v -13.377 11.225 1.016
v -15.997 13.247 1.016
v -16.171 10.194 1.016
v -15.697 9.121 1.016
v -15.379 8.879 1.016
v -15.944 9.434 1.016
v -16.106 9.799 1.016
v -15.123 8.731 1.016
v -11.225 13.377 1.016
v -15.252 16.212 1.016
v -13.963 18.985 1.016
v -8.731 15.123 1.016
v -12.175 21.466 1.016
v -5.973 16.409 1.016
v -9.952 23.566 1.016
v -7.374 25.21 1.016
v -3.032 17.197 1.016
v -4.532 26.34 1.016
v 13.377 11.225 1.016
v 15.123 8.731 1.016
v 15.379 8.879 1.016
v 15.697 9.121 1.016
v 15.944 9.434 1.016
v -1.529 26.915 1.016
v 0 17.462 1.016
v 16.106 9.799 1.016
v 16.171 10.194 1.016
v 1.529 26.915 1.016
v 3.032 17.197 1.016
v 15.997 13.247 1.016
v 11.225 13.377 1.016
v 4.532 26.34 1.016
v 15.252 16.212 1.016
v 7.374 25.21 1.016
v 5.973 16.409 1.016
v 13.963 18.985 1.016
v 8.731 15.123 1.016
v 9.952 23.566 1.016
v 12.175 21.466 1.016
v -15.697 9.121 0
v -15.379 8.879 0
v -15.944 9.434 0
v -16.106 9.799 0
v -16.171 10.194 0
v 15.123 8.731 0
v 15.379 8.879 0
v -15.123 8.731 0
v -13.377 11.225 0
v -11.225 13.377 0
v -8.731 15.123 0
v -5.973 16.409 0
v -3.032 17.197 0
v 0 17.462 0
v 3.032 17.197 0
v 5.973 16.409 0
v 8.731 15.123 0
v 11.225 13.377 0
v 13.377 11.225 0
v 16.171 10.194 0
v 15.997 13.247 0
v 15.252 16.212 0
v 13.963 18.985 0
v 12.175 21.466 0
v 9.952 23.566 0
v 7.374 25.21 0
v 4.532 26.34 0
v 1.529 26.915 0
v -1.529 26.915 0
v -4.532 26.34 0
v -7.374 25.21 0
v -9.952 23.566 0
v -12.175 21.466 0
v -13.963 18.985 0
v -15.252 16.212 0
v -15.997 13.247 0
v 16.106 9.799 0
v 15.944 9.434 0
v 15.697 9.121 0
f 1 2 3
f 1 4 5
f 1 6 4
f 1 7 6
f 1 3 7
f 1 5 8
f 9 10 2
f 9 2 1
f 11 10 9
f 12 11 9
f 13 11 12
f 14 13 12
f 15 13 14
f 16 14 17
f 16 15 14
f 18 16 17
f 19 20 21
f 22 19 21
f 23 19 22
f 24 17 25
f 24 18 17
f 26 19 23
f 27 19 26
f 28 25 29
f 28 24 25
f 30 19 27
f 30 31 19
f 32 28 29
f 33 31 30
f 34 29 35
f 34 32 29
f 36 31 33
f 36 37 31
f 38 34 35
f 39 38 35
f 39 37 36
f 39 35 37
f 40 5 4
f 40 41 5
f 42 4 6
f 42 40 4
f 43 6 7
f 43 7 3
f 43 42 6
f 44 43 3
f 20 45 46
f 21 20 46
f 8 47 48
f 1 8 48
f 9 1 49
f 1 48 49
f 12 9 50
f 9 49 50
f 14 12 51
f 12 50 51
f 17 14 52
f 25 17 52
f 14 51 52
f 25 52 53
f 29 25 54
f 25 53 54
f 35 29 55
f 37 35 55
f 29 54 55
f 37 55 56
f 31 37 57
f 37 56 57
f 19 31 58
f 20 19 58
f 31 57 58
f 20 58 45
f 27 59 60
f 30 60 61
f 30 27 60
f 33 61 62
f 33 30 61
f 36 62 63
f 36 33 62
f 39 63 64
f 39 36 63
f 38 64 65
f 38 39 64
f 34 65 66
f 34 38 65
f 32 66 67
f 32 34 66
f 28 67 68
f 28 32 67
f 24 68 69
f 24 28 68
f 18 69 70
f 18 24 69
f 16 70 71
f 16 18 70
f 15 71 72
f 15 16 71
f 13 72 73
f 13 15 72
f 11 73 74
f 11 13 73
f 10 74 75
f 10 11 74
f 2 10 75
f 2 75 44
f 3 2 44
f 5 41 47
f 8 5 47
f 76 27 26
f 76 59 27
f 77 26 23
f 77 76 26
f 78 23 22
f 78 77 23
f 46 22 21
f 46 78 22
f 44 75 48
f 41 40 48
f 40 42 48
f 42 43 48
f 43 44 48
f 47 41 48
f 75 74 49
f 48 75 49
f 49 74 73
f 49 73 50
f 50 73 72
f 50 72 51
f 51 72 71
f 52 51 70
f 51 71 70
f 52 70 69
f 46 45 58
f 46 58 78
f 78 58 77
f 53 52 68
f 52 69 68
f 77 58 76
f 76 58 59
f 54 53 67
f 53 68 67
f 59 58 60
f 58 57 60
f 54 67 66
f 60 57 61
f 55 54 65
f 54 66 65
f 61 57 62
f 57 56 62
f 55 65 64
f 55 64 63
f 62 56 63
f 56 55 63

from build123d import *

# Parameters (mm, degrees)
BOSS_EXTRUDE1_DEPTH = 1.016
SKETCH2_OUTSIDE_W   = 58.782
SKETCH2_OUTSIDE_H   = 30.295
CUT_EXTRUDE1_DEPTH  = 36.715560747
FILLET1_R           = 1.5875


with BuildPart() as part:
    # Sketch1 → Boss-Extrude1 (new body)
    with BuildSketch(Plane.XY):
        with BuildLine():
            Line((-23.371860585, 13.49375), (-15.122968614, 8.73125))
            ThreePointArc((-15.122968614, 8.73125), (0, 17.4625), (15.122968614, 8.73125))
            Line((15.122968614, 8.73125), (23.371860585, 13.49375))
            ThreePointArc((23.371860585, 13.49375), (0, 26.9875), (-23.371860585, 13.49375))
        make_face()
    extrude(amount=BOSS_EXTRUDE1_DEPTH)

    # Sketch2 outside → Cut-Extrude1 (cut, through all)
    with BuildSketch(Plane.XY.offset(1.016)):
        with Locations((0, 17.8595)):
            Rectangle(SKETCH2_OUTSIDE_W, SKETCH2_OUTSIDE_H)
        with BuildLine():
            Line((-16.11283565, 9.30275), (-15.122968614, 8.73125))
            ThreePointArc((-15.122968614, 8.73125), (0, 17.4625), (15.122968614, 8.73125))
            Line((15.122968614, 8.73125), (16.11283565, 9.30275))
            ThreePointArc((16.11283565, 9.30275), (0, 26.9875), (-16.11283565, 9.30275))
        make_face(mode=Mode.SUBTRACT)
    extrude(amount=-CUT_EXTRUDE1_DEPTH, mode=Mode.SUBTRACT)

    # Fillet1
    fillet1_edges = [part.edges().sort_by_distance(p)[0] for p in [
        (16.11283565, 9.30275, 0.508),
        (-16.11283565, 9.30275, 0.508),
    ]]
    fillet(fillet1_edges, radius=FILLET1_R)


solid = part.part
